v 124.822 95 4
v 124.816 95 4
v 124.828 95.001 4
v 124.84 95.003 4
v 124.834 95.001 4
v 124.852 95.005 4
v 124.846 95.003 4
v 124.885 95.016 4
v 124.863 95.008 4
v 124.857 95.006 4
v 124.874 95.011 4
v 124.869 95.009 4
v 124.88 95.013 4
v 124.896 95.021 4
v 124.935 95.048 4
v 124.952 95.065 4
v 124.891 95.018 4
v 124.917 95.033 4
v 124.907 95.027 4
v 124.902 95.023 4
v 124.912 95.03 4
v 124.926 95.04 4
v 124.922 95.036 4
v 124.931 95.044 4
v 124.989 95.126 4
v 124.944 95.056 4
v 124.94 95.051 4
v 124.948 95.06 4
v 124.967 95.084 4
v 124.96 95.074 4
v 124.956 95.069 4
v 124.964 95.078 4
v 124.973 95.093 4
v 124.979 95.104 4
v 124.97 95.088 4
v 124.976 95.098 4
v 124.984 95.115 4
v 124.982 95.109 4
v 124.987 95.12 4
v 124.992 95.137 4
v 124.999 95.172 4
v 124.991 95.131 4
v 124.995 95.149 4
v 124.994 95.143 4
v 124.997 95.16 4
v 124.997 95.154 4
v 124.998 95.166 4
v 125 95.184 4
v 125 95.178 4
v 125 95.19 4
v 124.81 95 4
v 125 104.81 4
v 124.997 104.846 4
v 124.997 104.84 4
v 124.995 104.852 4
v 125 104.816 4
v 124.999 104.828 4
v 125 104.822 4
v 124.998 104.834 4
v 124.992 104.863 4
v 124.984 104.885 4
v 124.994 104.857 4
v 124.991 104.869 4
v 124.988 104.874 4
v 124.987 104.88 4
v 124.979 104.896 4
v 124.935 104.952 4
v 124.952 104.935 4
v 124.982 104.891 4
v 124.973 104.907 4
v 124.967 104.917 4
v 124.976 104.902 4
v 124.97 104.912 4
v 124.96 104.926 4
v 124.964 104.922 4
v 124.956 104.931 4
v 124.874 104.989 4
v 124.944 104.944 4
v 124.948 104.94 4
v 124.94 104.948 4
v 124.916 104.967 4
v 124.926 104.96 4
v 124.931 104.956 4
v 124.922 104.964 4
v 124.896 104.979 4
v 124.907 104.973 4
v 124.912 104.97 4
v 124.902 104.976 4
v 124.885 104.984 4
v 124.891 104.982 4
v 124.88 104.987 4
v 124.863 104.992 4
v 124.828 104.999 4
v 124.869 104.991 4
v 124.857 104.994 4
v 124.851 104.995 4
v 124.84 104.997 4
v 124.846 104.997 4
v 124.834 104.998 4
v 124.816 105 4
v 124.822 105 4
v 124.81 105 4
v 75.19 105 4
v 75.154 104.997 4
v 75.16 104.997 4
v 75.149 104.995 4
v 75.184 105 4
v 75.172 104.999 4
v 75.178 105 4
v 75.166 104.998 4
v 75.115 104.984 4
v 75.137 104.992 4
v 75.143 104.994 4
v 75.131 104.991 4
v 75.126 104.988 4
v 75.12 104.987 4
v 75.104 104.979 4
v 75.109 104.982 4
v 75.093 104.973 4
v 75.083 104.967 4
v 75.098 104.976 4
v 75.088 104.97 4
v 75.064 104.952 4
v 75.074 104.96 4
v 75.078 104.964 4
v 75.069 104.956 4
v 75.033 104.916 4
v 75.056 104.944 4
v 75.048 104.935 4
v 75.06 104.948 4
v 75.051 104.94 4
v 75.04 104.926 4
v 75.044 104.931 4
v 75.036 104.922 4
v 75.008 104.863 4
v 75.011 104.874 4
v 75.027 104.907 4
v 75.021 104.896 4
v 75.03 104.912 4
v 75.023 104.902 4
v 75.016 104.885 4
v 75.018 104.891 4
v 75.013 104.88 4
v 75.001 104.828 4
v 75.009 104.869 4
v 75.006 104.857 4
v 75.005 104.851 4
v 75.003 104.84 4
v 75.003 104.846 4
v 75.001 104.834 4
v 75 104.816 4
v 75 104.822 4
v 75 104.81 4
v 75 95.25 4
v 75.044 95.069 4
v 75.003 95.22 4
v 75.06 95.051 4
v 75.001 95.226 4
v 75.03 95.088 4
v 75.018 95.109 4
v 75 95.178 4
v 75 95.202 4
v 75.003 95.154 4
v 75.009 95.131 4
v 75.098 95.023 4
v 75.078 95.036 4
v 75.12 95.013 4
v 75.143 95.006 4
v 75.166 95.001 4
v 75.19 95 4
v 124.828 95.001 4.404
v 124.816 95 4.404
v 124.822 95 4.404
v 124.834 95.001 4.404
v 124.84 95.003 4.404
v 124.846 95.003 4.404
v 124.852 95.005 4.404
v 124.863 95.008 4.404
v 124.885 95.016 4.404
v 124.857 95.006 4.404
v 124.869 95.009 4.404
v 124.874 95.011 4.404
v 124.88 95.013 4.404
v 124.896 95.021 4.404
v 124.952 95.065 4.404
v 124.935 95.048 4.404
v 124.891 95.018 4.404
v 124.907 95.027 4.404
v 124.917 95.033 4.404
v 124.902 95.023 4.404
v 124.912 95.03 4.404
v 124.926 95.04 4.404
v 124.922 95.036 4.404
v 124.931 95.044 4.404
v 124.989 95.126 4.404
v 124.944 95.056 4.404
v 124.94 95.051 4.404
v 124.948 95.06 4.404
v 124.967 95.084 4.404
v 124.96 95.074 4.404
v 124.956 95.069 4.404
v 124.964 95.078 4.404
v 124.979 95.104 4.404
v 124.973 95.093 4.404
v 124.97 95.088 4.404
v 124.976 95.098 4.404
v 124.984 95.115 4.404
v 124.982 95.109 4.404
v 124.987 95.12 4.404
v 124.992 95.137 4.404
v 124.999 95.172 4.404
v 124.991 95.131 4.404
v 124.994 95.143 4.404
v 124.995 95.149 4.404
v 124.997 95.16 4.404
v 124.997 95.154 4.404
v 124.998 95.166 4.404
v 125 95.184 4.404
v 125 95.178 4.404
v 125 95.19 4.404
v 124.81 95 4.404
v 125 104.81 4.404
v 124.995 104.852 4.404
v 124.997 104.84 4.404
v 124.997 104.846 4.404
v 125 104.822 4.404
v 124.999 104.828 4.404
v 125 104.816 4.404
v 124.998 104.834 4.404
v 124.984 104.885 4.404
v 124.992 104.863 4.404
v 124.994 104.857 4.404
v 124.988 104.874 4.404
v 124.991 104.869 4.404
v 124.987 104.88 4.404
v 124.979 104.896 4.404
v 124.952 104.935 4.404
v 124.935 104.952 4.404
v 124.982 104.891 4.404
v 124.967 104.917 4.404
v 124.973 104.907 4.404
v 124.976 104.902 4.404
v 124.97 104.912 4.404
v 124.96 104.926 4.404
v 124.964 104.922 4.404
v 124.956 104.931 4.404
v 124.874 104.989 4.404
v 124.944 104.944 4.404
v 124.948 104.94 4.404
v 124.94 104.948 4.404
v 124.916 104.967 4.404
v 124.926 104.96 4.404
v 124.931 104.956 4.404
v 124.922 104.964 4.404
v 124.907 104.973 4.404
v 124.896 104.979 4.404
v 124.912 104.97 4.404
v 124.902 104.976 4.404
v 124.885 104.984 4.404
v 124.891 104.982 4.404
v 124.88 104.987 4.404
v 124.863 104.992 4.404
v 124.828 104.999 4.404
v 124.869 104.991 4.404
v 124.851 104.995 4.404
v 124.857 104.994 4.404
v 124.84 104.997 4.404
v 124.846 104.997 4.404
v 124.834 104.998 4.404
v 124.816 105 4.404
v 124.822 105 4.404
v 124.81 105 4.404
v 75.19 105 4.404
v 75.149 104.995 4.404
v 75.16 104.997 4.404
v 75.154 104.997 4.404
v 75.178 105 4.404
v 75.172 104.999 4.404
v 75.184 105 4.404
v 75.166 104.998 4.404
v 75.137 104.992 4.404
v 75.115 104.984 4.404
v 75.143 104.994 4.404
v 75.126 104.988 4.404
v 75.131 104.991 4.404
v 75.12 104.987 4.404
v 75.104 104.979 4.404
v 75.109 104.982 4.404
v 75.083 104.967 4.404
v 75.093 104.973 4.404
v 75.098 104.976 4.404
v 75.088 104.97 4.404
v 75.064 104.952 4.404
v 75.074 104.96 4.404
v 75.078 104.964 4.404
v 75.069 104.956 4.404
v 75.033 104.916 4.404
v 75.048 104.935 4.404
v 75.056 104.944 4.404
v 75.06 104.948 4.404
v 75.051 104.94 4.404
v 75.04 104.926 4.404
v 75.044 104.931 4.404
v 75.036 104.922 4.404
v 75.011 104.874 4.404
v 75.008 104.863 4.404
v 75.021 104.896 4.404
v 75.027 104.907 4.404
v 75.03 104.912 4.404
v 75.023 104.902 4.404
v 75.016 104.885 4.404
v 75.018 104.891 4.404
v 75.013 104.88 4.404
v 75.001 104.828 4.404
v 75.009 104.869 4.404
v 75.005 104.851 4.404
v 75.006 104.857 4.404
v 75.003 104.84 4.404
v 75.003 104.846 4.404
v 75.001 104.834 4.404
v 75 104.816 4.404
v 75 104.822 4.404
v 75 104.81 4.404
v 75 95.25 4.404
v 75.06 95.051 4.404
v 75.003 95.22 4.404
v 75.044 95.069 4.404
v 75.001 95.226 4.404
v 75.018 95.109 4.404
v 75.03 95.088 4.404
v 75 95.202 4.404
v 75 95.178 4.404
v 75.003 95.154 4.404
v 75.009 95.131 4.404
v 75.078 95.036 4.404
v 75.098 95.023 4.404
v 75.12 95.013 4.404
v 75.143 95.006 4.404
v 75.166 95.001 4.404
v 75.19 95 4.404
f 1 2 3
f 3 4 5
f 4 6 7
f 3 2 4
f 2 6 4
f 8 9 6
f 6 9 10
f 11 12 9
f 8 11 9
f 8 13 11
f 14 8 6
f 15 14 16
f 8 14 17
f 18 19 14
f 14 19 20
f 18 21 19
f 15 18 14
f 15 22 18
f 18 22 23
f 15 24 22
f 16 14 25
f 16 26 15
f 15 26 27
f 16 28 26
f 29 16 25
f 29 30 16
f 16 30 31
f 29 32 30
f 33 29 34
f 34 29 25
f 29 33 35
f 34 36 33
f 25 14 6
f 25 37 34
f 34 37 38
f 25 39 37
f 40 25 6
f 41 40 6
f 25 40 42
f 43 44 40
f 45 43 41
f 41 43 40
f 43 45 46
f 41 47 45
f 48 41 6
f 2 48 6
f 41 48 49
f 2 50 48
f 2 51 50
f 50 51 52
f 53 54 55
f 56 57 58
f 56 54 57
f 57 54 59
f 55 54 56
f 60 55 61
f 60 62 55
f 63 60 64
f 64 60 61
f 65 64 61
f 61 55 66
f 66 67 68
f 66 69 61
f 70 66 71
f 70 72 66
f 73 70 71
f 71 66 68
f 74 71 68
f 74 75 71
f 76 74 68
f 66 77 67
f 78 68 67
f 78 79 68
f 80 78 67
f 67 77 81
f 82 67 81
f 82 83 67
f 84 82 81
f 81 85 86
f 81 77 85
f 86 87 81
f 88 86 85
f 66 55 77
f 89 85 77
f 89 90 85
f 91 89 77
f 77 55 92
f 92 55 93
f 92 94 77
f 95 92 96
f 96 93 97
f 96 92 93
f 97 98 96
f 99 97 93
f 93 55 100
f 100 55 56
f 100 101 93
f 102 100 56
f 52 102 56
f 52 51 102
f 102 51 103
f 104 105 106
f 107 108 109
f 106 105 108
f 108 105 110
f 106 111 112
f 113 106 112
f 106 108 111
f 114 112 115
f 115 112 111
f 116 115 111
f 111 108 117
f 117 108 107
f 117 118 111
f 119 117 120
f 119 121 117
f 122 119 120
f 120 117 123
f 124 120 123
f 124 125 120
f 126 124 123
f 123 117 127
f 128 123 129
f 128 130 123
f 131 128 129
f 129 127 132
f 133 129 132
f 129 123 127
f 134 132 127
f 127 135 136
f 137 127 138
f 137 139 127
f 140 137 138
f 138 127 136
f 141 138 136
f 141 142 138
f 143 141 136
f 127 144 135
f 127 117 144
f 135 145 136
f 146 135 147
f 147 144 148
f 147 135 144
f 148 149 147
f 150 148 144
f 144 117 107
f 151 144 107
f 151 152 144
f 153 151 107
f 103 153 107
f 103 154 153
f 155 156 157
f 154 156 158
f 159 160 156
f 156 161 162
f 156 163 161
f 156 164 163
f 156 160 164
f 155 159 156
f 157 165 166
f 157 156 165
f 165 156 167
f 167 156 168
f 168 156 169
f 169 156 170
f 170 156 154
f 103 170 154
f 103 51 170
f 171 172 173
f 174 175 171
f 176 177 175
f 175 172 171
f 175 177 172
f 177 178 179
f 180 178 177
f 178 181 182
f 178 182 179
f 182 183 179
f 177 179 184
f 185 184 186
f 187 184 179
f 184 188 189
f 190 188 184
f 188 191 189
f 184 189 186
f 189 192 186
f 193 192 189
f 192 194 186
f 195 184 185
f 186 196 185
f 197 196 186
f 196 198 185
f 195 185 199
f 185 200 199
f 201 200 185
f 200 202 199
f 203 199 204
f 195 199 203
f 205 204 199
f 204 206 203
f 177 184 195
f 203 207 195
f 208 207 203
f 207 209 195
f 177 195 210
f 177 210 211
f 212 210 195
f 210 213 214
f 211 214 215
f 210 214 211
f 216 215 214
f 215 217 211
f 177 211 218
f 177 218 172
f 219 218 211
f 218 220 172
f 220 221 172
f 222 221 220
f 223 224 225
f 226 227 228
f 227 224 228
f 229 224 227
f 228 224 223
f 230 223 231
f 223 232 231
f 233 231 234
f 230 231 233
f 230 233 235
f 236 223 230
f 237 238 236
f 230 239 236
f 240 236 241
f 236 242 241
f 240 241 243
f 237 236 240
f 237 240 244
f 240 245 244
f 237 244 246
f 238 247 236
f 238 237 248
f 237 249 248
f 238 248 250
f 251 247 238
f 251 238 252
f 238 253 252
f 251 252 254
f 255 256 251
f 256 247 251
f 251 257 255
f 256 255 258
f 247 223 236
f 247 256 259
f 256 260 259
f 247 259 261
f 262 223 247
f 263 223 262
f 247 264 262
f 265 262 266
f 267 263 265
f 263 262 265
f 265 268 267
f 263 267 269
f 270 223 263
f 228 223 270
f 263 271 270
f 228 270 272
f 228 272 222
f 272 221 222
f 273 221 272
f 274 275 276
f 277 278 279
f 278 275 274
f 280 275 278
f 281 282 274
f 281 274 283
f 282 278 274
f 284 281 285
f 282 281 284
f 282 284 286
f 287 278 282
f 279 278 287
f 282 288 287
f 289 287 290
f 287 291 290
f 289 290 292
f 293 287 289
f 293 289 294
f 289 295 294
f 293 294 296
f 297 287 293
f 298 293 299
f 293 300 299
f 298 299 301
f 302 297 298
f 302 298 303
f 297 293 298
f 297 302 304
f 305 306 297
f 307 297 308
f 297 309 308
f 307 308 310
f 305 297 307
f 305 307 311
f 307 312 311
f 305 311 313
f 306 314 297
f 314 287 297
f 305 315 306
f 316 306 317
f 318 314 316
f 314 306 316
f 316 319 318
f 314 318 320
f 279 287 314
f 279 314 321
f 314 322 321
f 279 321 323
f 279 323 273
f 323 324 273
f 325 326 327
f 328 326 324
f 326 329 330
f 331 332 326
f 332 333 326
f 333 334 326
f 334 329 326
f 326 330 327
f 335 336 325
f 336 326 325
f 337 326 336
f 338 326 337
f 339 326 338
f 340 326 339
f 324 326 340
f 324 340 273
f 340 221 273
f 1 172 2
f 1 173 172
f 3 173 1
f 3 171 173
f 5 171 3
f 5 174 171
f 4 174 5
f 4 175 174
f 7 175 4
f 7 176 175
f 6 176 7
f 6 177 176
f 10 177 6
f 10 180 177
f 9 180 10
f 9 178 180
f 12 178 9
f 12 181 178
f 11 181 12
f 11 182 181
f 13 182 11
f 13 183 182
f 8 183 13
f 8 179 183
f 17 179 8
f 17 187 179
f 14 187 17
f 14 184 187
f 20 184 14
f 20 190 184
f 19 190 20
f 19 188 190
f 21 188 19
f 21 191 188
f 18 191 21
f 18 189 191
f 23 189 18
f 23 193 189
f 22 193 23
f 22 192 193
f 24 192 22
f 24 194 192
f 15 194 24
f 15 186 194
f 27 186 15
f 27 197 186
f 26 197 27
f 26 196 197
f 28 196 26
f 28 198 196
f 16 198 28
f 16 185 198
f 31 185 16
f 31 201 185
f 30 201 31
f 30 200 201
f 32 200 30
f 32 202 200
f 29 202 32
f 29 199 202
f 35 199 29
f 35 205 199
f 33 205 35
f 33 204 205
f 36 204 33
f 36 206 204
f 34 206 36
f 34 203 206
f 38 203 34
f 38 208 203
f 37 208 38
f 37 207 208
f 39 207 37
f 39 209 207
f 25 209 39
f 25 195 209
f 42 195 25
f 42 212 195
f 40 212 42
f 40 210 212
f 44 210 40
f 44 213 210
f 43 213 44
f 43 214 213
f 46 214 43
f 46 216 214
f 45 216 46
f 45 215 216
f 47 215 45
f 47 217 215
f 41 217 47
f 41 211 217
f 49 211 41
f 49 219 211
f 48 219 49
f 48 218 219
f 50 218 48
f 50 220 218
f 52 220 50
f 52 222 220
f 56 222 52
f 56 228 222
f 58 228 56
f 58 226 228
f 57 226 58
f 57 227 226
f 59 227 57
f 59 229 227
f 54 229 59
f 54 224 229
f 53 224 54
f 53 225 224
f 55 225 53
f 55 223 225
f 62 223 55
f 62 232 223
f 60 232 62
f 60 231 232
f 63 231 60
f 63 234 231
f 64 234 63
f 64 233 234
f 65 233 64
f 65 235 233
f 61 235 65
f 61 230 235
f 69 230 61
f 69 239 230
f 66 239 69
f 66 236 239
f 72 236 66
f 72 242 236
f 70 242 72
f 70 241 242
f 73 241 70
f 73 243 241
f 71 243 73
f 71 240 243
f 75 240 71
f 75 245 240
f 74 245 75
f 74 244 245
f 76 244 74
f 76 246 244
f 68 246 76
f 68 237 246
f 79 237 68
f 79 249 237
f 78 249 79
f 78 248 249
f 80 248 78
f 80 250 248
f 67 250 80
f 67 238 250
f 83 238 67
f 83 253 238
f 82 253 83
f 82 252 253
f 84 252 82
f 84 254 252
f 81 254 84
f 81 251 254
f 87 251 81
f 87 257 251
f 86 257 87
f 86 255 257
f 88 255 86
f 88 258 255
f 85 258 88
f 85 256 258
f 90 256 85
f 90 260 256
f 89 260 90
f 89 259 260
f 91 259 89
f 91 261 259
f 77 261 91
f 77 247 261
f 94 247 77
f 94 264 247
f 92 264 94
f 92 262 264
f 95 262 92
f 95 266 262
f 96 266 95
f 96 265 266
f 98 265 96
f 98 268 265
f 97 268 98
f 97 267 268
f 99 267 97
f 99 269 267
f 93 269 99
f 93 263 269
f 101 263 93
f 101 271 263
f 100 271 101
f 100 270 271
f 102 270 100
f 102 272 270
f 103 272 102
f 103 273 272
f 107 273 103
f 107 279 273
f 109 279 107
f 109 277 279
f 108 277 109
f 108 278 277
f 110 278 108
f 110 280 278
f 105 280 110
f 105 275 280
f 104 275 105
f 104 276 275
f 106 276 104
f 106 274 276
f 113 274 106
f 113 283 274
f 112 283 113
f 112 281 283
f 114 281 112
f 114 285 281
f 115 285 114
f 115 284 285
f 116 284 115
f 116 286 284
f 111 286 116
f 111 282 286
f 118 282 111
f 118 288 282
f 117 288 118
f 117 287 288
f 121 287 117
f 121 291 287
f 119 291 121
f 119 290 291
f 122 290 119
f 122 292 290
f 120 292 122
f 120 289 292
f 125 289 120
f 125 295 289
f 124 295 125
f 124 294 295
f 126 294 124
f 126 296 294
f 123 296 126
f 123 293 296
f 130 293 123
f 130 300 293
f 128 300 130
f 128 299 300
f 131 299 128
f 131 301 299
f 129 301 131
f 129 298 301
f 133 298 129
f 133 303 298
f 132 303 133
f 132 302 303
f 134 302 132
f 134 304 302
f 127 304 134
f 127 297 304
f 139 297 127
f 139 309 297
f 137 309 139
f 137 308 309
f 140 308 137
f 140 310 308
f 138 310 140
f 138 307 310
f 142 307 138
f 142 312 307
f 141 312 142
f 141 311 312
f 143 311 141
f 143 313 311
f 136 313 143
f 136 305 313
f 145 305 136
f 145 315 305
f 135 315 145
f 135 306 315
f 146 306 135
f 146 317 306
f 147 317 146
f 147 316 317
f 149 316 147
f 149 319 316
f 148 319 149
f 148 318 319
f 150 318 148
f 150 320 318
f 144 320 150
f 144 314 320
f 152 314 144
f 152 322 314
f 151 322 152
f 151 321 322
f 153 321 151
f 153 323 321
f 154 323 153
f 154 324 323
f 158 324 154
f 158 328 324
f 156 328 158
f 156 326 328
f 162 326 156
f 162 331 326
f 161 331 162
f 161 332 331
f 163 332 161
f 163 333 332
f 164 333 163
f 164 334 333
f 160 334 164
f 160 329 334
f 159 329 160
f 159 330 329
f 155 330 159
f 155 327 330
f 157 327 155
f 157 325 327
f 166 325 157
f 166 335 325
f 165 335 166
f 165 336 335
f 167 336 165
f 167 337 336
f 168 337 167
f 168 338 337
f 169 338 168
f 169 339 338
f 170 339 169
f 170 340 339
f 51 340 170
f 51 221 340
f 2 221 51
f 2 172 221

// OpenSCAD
module drawBasicShape(x1, y1, x2, y2, width)
{
	length = sqrt((x1-x2)*(x1-x2) + (y1-y2)*(y1-y2));
	if (width!=0.0) {
		square(size = [width, length], center = false);
		translate([width/2.0, 0, 0]) circle(d=width);
		translate([width/2.0, length, 0]) circle(d=width);
	}
}

module translateAndRotate(x1, y1, x2, y2, width)
{
	if (width != 0.0) {
		angle = atan((y2-y1)/(x2-x1)) +270;
		if (x2>=x1) {
			translate([x1, y1, 0.0]) rotate([0.0, 0.0, angle]) translate([-width/2.0, 0.0, 0.0]) scale([1.0, 1.0, 1.0]) drawBasicShape(x1, y1, x2, y2, width);
		}
		else {
			translate([x1, y1, 0.0]) rotate([0.0, 0.0, angle+180]) translate([-width/2.0, 0.0, 0.0]) scale([1.0, 1.0, 1.0]) drawBasicShape(x1, y1, x2, y2, width);		}
	}
}

$fn=50;

points9 = [
[75.77800000, 95.77800000, 0.00000000],
[124.22200000, 95.77800000, 0.37999672],
[124.22200000, 104.22200000, 0.37997788],
[75.77800000, 104.22200000, 0.37999548],
[75.77800000, 95.83800000, 0.37998140],
[75.48400000, 95.48400000, 0.00000000],
[124.51600000, 95.48400000, 0.37999746],
[124.51600000, 104.51600000, 0.37998977],
[75.48400000, 104.51600000, 0.37999868],
[75.48400000, 95.54400000, 0.37998644],
[75.19000000, 95.19000000, 0.00000000],
[124.81000000, 95.19000000, 0.38000060],
[124.81000000, 104.81000000, 0.38000021],
[75.19000000, 104.81000000, 0.37999939],
[75.19000000, 95.25000000, 0.37999715],
[75.53600000, 95.39000000, 0.00000000],
[76.11100000, 95.94600000, 0.00000000],
[75.94600000, 96.11100000, 0.37961375],
[75.94600000, 96.52800000, 0.38001190],
[76.52800000, 95.94600000, 0.37997240],
[76.94500000, 95.94600000, 0.38001190],
[75.94600000, 96.94500000, 0.37994651],
[75.94600000, 97.36200000, 0.38001190],
[77.36200000, 95.94600000, 0.37999592],
[77.77900000, 95.94600000, 0.38001190],
[75.94600000, 97.77900000, 0.38002285],
[75.94600000, 98.19600000, 0.38001190],
[78.19600000, 95.94600000, 0.38000201],
[78.61300000, 95.94600000, 0.38001190],
[75.94600000, 98.61300000, 0.38001957],
[75.94600000, 99.03000000, 0.38001190],
[79.03000000, 95.94600000, 0.38001859],
[79.44700000, 95.94600000, 0.38015610],
[75.94600000, 99.44700000, 0.38001785],
[75.94600000, 99.86400000, 0.38001190],
[79.86400000, 95.94600000, 0.38002811],
[80.28100000, 95.94600000, 0.38001190],
[75.94600000, 100.28100000, 0.38002660],
[75.94600000, 100.69800000, 0.38015610],
[80.69800000, 95.94600000, 0.38002534],
[81.11500000, 95.94600000, 0.38001190],
[75.94600000, 101.11500000, 0.38003252],
[75.94600000, 101.53300000, 0.37930814],
[81.53300000, 95.94600000, 0.37997836],
[81.95000000, 95.94600000, 0.38001190],
[75.94600000, 101.95000000, 0.37998780],
[75.94600000, 102.36700000, 0.38001190],
[82.36700000, 95.94600000, 0.37998939],
[82.78400000, 95.94600000, 0.38001190],
[75.94600000, 102.78400000, 0.37999079],
[75.94600000, 103.20100000, 0.38001190],
[83.20100000, 95.94600000, 0.37999203],
[83.61800000, 95.94600000, 0.38015610],
[75.94600000, 103.61800000, 0.37999314],
[75.95600000, 104.02400000, 0.38048727],
[84.03500000, 95.94600000, 0.38000275],
[84.45200000, 95.94600000, 0.38001190],
[76.34400000, 104.05400000, 0.38000229],
[76.76100000, 104.05400000, 0.38015610],
[84.86900000, 95.94600000, 0.38000229],
[85.28600000, 95.94600000, 0.38001190],
[77.17800000, 104.05400000, 0.38000754],
[77.59500000, 104.05400000, 0.38001190],
[85.70300000, 95.94600000, 0.38000229],
[86.12000000, 95.94600000, 0.38001190],
[78.01200000, 104.05400000, 0.38000754],
[78.42900000, 104.05400000, 0.38001190],
[86.53700000, 95.94600000, 0.38000229],
[86.95400000, 95.94600000, 0.38015610],
[78.84600000, 104.05400000, 0.38000229],
[79.26300000, 104.05400000, 0.38001190],
[87.37100000, 95.94600000, 0.38000754],
[87.78900000, 95.94600000, 0.37930814],
[79.68000000, 104.05400000, 0.37998415],
[80.09700000, 104.05400000, 0.38001190],
[88.20600000, 95.94600000, 0.37998940],
[88.62300000, 95.94600000, 0.38001190],
[80.51500000, 104.05400000, 0.38000229],
[80.93200000, 104.05400000, 0.38015610],
[89.04000000, 95.94600000, 0.38000229],
[89.45700000, 95.94600000, 0.38001190],
[81.34900000, 104.05400000, 0.38000754],
[81.76600000, 104.05400000, 0.38001190],
[89.87400000, 95.94600000, 0.38000229],
[90.29100000, 95.94600000, 0.38001190],
[82.18300000, 104.05400000, 0.38000754],
[82.60000000, 104.05400000, 0.38001190],
[90.70800000, 95.94600000, 0.38000229],
[91.12500000, 95.94600000, 0.38015610],
[83.01700000, 104.05400000, 0.38000229],
[83.43400000, 104.05400000, 0.38001190],
[91.54200000, 95.94600000, 0.38000754],
[91.95900000, 95.94600000, 0.38001190],
[83.85100000, 104.05400000, 0.38000229],
[84.26800000, 104.05400000, 0.38001190],
[92.37600000, 95.94600000, 0.38000754],
[92.79300000, 95.94600000, 0.38001190],
[84.68500000, 104.05400000, 0.38000229],
[85.10200000, 104.05400000, 0.38015610],
[93.21000000, 95.94600000, 0.38000229],
[93.62700000, 95.94600000, 0.38001190],
[85.51900000, 104.05400000, 0.38000754],
[85.93600000, 104.05400000, 0.38001190],
[94.04400000, 95.94600000, 0.38000229],
[94.46200000, 95.94600000, 0.37930814],
[86.35300000, 104.05400000, 0.37998940],
[86.77000000, 104.05400000, 0.38001190],
[94.87900000, 95.94600000, 0.37998415],
[95.29600000, 95.94600000, 0.38015610],
[87.18800000, 104.05400000, 0.38000229],
[87.60500000, 104.05400000, 0.38001190],
[95.71300000, 95.94600000, 0.38000229],
[96.13000000, 95.94600000, 0.38015610],
[88.02200000, 104.05400000, 0.38000229],
[88.43900000, 104.05400000, 0.38001190],
[96.54700000, 95.94600000, 0.38000754],
[96.96400000, 95.94600000, 0.38001190],
[88.85600000, 104.05400000, 0.38000229],
[89.27300000, 104.05400000, 0.38015610],
[97.38100000, 95.94600000, 0.38000229],
[97.79800000, 95.94600000, 0.38001190],
[89.69000000, 104.05400000, 0.38000229],
[90.10700000, 104.05400000, 0.38015610],
[98.21500000, 95.94600000, 0.38000229],
[98.63200000, 95.94600000, 0.38001190],
[90.52400000, 104.05400000, 0.38000754],
[90.94100000, 104.05400000, 0.38001190],
[99.04900000, 95.94600000, 0.38000229],
[99.46600000, 95.94600000, 0.38001190],
[91.35800000, 104.05400000, 0.38000754],
[91.77500000, 104.05400000, 0.38001190],
[99.88300000, 95.94600000, 0.38000229],
[100.30000000, 95.94600000, 0.38015610],
[92.19200000, 104.05400000, 0.38000229],
[92.60900000, 104.05400000, 0.38001190],
[100.71800000, 95.94600000, 0.37998940],
[101.13500000, 95.94600000, 0.38001190],
[93.02600000, 104.05400000, 0.37998415],
[93.44400000, 104.05400000, 0.37930814],
[101.55200000, 95.94600000, 0.38000754],
[101.96900000, 95.94600000, 0.38001190],
[93.86100000, 104.05400000, 0.38000229],
[94.27800000, 104.05400000, 0.38015610],
[102.38600000, 95.94600000, 0.38000229],
[102.80300000, 95.94600000, 0.38001190],
[94.69500000, 104.05400000, 0.38000754],
[95.11200000, 104.05400000, 0.38001190],
[103.22000000, 95.94600000, 0.38000229],
[103.63700000, 95.94600000, 0.38015610],
[95.52900000, 104.05400000, 0.38000229],
[95.94600000, 104.05400000, 0.38001190],
[104.05400000, 95.94600000, 0.38000229],
[104.47100000, 95.94600000, 0.38015610],
[96.36300000, 104.05400000, 0.38000229],
[96.78000000, 104.05400000, 0.38001190],
[104.88800000, 95.94600000, 0.38000754],
[105.30500000, 95.94600000, 0.38001190],
[97.19700000, 104.05400000, 0.38000229],
[97.61400000, 104.05400000, 0.38015610],
[105.72200000, 95.94600000, 0.38000229],
[106.13900000, 95.94600000, 0.38001190],
[98.03100000, 104.05400000, 0.38000229],
[98.44800000, 104.05400000, 0.38015610],
[106.55600000, 95.94600000, 0.38000229],
[106.97300000, 95.94600000, 0.38001190],
[98.86500000, 104.05400000, 0.38000754],
[99.28200000, 104.05400000, 0.38001190],
[107.39100000, 95.94600000, 0.37998415],
[107.80800000, 95.94600000, 0.38015610],
[99.69900000, 104.05400000, 0.37998415],
[100.11700000, 104.05400000, 0.37930814],
[108.22500000, 95.94600000, 0.38000754],
[108.64200000, 95.94600000, 0.38001190],
[100.53400000, 104.05400000, 0.38000229],
[100.95100000, 104.05400000, 0.38001190],
[109.05900000, 95.94600000, 0.38000754],
[109.47600000, 95.94600000, 0.38001190],
[101.36800000, 104.05400000, 0.38000229],
[101.78500000, 104.05400000, 0.38015610],
[109.89300000, 95.94600000, 0.38000229],
[110.31000000, 95.94600000, 0.38001190],
[102.20200000, 104.05400000, 0.38000229],
[102.61900000, 104.05400000, 0.38015610],
[110.72700000, 95.94600000, 0.38000229],
[111.14400000, 95.94600000, 0.38001190],
[103.03600000, 104.05400000, 0.38000754],
[103.45300000, 104.05400000, 0.38001190],
[111.56100000, 95.94600000, 0.38000229],
[111.97800000, 95.94600000, 0.38015610],
[103.87000000, 104.05400000, 0.38000229],
[104.28700000, 104.05400000, 0.38001190],
[112.39500000, 95.94600000, 0.38000229],
[112.81200000, 95.94600000, 0.38015610],
[104.70400000, 104.05400000, 0.38000229],
[105.12100000, 104.05400000, 0.38001190],
[113.22900000, 95.94600000, 0.38000754],
[113.64700000, 95.94600000, 0.37930814],
[105.53800000, 104.05400000, 0.37998415],
[105.95500000, 104.05400000, 0.38001190],
[114.06400000, 95.94600000, 0.37998940],
[114.48100000, 95.94600000, 0.38001190],
[106.37300000, 104.05400000, 0.38000229],
[106.79000000, 104.05400000, 0.38015610],
[114.89800000, 95.94600000, 0.38000229],
[115.31500000, 95.94600000, 0.38001190],
[107.20700000, 104.05400000, 0.38000754],
[107.62400000, 104.05400000, 0.38001190],
[115.73200000, 95.94600000, 0.38000229],
[116.14900000, 95.94600000, 0.38001190],
[108.04100000, 104.05400000, 0.38000754],
[108.45800000, 104.05400000, 0.38001190],
[116.56600000, 95.94600000, 0.38000229],
[116.98300000, 95.94600000, 0.38015610],
[108.87500000, 104.05400000, 0.38000229],
[109.29200000, 104.05400000, 0.38001190],
[117.40000000, 95.94600000, 0.38000754],
[117.81700000, 95.94600000, 0.38001190],
[109.70900000, 104.05400000, 0.38000229],
[110.12600000, 104.05400000, 0.38001190],
[118.23400000, 95.94600000, 0.38000754],
[118.65100000, 95.94600000, 0.38001190],
[110.54300000, 104.05400000, 0.38000229],
[110.96000000, 104.05400000, 0.38015610],
[119.06800000, 95.94600000, 0.38000229],
[119.48500000, 95.94600000, 0.38001190],
[111.37700000, 104.05400000, 0.38000754],
[111.79400000, 104.05400000, 0.38001190],
[119.90200000, 95.94600000, 0.38000229],
[120.32000000, 95.94600000, 0.37930814],
[112.21100000, 104.05400000, 0.37998940],
[112.62900000, 104.05400000, 0.37930814],
[120.73700000, 95.94600000, 0.38000229],
[121.15400000, 95.94600000, 0.38015610],
[113.04600000, 104.05400000, 0.38000229],
[113.46300000, 104.05400000, 0.38001190],
[121.57100000, 95.94600000, 0.38000754],
[121.98800000, 95.94600000, 0.38001190],
[113.88000000, 104.05400000, 0.38000229],
[114.29700000, 104.05400000, 0.38001190],
[122.40500000, 95.94600000, 0.38000754],
[122.82200000, 95.94600000, 0.38001190],
[114.71400000, 104.05400000, 0.38000229],
[115.13100000, 104.05400000, 0.38015610],
[123.23900000, 95.94600000, 0.38000229],
[123.65600000, 95.94600000, 0.38001190],
[115.54800000, 104.05400000, 0.38000754],
[115.96500000, 104.05400000, 0.38001190],
[124.04400000, 95.97500000, 0.37998455],
[124.05400000, 96.38200000, 0.37976376],
[116.38200000, 104.05400000, 0.37999868],
[116.79900000, 104.05400000, 0.38001190],
[124.05400000, 96.79900000, 0.37999203],
[124.05400000, 97.21600000, 0.38015610],
[117.21600000, 104.05400000, 0.37999079],
[117.63300000, 104.05400000, 0.38001190],
[124.05400000, 97.63300000, 0.37998939],
[124.05400000, 98.05000000, 0.38015610],
[118.05000000, 104.05400000, 0.37998072],
[118.46700000, 104.05400000, 0.38001190],
[124.05400000, 98.46700000, 0.37998597],
[124.05400000, 98.88400000, 0.38001190],
[118.88400000, 104.05400000, 0.37997562],
[119.30200000, 104.05400000, 0.37930814],
[124.05400000, 99.30200000, 0.38003429],
[124.05400000, 99.71900000, 0.38001190],
[119.71900000, 104.05400000, 0.38003640],
[120.13600000, 104.05400000, 0.38001190],
[124.05400000, 100.13600000, 0.38002811],
[124.05400000, 100.55300000, 0.38001190],
[120.55300000, 104.05400000, 0.38002999],
[120.97000000, 104.05400000, 0.38001190],
[124.05400000, 100.97000000, 0.38003238],
[124.05400000, 101.38700000, 0.38001190],
[121.38700000, 104.05400000, 0.38001957],
[121.80400000, 104.05400000, 0.38001190],
[124.05400000, 101.80400000, 0.38002091],
[124.05400000, 102.22100000, 0.38001190],
[122.22100000, 104.05400000, 0.38002285],
[122.63800000, 104.05400000, 0.38001190],
[124.05400000, 102.63800000, 0.37999592],
[124.05400000, 103.05500000, 0.38001190],
[123.05500000, 104.05400000, 0.37998907],
[123.47200000, 104.05400000, 0.38001190],
[124.05400000, 103.47200000, 0.37997240],
[124.05400000, 103.88900000, 0.38001190],
[123.88900000, 104.05400000, 0.37961375],
];

translate([0.0, 0.0, 4.00000000]) {
	linear_extrude(height = 0.40400000, center = false, convexity = 10, twist = 0) {
		union() {
			for( i=[0:len(points9)-2] ){ 
				x1 = points9[i][0];
				y1 = points9[i][1];
				x2 = points9[i+1][0];
				y2 = points9[i+1][1];
				width = points9[i+1][2];
				translateAndRotate(x1, y1, x2, y2, width);
			}
		}
	}
}
